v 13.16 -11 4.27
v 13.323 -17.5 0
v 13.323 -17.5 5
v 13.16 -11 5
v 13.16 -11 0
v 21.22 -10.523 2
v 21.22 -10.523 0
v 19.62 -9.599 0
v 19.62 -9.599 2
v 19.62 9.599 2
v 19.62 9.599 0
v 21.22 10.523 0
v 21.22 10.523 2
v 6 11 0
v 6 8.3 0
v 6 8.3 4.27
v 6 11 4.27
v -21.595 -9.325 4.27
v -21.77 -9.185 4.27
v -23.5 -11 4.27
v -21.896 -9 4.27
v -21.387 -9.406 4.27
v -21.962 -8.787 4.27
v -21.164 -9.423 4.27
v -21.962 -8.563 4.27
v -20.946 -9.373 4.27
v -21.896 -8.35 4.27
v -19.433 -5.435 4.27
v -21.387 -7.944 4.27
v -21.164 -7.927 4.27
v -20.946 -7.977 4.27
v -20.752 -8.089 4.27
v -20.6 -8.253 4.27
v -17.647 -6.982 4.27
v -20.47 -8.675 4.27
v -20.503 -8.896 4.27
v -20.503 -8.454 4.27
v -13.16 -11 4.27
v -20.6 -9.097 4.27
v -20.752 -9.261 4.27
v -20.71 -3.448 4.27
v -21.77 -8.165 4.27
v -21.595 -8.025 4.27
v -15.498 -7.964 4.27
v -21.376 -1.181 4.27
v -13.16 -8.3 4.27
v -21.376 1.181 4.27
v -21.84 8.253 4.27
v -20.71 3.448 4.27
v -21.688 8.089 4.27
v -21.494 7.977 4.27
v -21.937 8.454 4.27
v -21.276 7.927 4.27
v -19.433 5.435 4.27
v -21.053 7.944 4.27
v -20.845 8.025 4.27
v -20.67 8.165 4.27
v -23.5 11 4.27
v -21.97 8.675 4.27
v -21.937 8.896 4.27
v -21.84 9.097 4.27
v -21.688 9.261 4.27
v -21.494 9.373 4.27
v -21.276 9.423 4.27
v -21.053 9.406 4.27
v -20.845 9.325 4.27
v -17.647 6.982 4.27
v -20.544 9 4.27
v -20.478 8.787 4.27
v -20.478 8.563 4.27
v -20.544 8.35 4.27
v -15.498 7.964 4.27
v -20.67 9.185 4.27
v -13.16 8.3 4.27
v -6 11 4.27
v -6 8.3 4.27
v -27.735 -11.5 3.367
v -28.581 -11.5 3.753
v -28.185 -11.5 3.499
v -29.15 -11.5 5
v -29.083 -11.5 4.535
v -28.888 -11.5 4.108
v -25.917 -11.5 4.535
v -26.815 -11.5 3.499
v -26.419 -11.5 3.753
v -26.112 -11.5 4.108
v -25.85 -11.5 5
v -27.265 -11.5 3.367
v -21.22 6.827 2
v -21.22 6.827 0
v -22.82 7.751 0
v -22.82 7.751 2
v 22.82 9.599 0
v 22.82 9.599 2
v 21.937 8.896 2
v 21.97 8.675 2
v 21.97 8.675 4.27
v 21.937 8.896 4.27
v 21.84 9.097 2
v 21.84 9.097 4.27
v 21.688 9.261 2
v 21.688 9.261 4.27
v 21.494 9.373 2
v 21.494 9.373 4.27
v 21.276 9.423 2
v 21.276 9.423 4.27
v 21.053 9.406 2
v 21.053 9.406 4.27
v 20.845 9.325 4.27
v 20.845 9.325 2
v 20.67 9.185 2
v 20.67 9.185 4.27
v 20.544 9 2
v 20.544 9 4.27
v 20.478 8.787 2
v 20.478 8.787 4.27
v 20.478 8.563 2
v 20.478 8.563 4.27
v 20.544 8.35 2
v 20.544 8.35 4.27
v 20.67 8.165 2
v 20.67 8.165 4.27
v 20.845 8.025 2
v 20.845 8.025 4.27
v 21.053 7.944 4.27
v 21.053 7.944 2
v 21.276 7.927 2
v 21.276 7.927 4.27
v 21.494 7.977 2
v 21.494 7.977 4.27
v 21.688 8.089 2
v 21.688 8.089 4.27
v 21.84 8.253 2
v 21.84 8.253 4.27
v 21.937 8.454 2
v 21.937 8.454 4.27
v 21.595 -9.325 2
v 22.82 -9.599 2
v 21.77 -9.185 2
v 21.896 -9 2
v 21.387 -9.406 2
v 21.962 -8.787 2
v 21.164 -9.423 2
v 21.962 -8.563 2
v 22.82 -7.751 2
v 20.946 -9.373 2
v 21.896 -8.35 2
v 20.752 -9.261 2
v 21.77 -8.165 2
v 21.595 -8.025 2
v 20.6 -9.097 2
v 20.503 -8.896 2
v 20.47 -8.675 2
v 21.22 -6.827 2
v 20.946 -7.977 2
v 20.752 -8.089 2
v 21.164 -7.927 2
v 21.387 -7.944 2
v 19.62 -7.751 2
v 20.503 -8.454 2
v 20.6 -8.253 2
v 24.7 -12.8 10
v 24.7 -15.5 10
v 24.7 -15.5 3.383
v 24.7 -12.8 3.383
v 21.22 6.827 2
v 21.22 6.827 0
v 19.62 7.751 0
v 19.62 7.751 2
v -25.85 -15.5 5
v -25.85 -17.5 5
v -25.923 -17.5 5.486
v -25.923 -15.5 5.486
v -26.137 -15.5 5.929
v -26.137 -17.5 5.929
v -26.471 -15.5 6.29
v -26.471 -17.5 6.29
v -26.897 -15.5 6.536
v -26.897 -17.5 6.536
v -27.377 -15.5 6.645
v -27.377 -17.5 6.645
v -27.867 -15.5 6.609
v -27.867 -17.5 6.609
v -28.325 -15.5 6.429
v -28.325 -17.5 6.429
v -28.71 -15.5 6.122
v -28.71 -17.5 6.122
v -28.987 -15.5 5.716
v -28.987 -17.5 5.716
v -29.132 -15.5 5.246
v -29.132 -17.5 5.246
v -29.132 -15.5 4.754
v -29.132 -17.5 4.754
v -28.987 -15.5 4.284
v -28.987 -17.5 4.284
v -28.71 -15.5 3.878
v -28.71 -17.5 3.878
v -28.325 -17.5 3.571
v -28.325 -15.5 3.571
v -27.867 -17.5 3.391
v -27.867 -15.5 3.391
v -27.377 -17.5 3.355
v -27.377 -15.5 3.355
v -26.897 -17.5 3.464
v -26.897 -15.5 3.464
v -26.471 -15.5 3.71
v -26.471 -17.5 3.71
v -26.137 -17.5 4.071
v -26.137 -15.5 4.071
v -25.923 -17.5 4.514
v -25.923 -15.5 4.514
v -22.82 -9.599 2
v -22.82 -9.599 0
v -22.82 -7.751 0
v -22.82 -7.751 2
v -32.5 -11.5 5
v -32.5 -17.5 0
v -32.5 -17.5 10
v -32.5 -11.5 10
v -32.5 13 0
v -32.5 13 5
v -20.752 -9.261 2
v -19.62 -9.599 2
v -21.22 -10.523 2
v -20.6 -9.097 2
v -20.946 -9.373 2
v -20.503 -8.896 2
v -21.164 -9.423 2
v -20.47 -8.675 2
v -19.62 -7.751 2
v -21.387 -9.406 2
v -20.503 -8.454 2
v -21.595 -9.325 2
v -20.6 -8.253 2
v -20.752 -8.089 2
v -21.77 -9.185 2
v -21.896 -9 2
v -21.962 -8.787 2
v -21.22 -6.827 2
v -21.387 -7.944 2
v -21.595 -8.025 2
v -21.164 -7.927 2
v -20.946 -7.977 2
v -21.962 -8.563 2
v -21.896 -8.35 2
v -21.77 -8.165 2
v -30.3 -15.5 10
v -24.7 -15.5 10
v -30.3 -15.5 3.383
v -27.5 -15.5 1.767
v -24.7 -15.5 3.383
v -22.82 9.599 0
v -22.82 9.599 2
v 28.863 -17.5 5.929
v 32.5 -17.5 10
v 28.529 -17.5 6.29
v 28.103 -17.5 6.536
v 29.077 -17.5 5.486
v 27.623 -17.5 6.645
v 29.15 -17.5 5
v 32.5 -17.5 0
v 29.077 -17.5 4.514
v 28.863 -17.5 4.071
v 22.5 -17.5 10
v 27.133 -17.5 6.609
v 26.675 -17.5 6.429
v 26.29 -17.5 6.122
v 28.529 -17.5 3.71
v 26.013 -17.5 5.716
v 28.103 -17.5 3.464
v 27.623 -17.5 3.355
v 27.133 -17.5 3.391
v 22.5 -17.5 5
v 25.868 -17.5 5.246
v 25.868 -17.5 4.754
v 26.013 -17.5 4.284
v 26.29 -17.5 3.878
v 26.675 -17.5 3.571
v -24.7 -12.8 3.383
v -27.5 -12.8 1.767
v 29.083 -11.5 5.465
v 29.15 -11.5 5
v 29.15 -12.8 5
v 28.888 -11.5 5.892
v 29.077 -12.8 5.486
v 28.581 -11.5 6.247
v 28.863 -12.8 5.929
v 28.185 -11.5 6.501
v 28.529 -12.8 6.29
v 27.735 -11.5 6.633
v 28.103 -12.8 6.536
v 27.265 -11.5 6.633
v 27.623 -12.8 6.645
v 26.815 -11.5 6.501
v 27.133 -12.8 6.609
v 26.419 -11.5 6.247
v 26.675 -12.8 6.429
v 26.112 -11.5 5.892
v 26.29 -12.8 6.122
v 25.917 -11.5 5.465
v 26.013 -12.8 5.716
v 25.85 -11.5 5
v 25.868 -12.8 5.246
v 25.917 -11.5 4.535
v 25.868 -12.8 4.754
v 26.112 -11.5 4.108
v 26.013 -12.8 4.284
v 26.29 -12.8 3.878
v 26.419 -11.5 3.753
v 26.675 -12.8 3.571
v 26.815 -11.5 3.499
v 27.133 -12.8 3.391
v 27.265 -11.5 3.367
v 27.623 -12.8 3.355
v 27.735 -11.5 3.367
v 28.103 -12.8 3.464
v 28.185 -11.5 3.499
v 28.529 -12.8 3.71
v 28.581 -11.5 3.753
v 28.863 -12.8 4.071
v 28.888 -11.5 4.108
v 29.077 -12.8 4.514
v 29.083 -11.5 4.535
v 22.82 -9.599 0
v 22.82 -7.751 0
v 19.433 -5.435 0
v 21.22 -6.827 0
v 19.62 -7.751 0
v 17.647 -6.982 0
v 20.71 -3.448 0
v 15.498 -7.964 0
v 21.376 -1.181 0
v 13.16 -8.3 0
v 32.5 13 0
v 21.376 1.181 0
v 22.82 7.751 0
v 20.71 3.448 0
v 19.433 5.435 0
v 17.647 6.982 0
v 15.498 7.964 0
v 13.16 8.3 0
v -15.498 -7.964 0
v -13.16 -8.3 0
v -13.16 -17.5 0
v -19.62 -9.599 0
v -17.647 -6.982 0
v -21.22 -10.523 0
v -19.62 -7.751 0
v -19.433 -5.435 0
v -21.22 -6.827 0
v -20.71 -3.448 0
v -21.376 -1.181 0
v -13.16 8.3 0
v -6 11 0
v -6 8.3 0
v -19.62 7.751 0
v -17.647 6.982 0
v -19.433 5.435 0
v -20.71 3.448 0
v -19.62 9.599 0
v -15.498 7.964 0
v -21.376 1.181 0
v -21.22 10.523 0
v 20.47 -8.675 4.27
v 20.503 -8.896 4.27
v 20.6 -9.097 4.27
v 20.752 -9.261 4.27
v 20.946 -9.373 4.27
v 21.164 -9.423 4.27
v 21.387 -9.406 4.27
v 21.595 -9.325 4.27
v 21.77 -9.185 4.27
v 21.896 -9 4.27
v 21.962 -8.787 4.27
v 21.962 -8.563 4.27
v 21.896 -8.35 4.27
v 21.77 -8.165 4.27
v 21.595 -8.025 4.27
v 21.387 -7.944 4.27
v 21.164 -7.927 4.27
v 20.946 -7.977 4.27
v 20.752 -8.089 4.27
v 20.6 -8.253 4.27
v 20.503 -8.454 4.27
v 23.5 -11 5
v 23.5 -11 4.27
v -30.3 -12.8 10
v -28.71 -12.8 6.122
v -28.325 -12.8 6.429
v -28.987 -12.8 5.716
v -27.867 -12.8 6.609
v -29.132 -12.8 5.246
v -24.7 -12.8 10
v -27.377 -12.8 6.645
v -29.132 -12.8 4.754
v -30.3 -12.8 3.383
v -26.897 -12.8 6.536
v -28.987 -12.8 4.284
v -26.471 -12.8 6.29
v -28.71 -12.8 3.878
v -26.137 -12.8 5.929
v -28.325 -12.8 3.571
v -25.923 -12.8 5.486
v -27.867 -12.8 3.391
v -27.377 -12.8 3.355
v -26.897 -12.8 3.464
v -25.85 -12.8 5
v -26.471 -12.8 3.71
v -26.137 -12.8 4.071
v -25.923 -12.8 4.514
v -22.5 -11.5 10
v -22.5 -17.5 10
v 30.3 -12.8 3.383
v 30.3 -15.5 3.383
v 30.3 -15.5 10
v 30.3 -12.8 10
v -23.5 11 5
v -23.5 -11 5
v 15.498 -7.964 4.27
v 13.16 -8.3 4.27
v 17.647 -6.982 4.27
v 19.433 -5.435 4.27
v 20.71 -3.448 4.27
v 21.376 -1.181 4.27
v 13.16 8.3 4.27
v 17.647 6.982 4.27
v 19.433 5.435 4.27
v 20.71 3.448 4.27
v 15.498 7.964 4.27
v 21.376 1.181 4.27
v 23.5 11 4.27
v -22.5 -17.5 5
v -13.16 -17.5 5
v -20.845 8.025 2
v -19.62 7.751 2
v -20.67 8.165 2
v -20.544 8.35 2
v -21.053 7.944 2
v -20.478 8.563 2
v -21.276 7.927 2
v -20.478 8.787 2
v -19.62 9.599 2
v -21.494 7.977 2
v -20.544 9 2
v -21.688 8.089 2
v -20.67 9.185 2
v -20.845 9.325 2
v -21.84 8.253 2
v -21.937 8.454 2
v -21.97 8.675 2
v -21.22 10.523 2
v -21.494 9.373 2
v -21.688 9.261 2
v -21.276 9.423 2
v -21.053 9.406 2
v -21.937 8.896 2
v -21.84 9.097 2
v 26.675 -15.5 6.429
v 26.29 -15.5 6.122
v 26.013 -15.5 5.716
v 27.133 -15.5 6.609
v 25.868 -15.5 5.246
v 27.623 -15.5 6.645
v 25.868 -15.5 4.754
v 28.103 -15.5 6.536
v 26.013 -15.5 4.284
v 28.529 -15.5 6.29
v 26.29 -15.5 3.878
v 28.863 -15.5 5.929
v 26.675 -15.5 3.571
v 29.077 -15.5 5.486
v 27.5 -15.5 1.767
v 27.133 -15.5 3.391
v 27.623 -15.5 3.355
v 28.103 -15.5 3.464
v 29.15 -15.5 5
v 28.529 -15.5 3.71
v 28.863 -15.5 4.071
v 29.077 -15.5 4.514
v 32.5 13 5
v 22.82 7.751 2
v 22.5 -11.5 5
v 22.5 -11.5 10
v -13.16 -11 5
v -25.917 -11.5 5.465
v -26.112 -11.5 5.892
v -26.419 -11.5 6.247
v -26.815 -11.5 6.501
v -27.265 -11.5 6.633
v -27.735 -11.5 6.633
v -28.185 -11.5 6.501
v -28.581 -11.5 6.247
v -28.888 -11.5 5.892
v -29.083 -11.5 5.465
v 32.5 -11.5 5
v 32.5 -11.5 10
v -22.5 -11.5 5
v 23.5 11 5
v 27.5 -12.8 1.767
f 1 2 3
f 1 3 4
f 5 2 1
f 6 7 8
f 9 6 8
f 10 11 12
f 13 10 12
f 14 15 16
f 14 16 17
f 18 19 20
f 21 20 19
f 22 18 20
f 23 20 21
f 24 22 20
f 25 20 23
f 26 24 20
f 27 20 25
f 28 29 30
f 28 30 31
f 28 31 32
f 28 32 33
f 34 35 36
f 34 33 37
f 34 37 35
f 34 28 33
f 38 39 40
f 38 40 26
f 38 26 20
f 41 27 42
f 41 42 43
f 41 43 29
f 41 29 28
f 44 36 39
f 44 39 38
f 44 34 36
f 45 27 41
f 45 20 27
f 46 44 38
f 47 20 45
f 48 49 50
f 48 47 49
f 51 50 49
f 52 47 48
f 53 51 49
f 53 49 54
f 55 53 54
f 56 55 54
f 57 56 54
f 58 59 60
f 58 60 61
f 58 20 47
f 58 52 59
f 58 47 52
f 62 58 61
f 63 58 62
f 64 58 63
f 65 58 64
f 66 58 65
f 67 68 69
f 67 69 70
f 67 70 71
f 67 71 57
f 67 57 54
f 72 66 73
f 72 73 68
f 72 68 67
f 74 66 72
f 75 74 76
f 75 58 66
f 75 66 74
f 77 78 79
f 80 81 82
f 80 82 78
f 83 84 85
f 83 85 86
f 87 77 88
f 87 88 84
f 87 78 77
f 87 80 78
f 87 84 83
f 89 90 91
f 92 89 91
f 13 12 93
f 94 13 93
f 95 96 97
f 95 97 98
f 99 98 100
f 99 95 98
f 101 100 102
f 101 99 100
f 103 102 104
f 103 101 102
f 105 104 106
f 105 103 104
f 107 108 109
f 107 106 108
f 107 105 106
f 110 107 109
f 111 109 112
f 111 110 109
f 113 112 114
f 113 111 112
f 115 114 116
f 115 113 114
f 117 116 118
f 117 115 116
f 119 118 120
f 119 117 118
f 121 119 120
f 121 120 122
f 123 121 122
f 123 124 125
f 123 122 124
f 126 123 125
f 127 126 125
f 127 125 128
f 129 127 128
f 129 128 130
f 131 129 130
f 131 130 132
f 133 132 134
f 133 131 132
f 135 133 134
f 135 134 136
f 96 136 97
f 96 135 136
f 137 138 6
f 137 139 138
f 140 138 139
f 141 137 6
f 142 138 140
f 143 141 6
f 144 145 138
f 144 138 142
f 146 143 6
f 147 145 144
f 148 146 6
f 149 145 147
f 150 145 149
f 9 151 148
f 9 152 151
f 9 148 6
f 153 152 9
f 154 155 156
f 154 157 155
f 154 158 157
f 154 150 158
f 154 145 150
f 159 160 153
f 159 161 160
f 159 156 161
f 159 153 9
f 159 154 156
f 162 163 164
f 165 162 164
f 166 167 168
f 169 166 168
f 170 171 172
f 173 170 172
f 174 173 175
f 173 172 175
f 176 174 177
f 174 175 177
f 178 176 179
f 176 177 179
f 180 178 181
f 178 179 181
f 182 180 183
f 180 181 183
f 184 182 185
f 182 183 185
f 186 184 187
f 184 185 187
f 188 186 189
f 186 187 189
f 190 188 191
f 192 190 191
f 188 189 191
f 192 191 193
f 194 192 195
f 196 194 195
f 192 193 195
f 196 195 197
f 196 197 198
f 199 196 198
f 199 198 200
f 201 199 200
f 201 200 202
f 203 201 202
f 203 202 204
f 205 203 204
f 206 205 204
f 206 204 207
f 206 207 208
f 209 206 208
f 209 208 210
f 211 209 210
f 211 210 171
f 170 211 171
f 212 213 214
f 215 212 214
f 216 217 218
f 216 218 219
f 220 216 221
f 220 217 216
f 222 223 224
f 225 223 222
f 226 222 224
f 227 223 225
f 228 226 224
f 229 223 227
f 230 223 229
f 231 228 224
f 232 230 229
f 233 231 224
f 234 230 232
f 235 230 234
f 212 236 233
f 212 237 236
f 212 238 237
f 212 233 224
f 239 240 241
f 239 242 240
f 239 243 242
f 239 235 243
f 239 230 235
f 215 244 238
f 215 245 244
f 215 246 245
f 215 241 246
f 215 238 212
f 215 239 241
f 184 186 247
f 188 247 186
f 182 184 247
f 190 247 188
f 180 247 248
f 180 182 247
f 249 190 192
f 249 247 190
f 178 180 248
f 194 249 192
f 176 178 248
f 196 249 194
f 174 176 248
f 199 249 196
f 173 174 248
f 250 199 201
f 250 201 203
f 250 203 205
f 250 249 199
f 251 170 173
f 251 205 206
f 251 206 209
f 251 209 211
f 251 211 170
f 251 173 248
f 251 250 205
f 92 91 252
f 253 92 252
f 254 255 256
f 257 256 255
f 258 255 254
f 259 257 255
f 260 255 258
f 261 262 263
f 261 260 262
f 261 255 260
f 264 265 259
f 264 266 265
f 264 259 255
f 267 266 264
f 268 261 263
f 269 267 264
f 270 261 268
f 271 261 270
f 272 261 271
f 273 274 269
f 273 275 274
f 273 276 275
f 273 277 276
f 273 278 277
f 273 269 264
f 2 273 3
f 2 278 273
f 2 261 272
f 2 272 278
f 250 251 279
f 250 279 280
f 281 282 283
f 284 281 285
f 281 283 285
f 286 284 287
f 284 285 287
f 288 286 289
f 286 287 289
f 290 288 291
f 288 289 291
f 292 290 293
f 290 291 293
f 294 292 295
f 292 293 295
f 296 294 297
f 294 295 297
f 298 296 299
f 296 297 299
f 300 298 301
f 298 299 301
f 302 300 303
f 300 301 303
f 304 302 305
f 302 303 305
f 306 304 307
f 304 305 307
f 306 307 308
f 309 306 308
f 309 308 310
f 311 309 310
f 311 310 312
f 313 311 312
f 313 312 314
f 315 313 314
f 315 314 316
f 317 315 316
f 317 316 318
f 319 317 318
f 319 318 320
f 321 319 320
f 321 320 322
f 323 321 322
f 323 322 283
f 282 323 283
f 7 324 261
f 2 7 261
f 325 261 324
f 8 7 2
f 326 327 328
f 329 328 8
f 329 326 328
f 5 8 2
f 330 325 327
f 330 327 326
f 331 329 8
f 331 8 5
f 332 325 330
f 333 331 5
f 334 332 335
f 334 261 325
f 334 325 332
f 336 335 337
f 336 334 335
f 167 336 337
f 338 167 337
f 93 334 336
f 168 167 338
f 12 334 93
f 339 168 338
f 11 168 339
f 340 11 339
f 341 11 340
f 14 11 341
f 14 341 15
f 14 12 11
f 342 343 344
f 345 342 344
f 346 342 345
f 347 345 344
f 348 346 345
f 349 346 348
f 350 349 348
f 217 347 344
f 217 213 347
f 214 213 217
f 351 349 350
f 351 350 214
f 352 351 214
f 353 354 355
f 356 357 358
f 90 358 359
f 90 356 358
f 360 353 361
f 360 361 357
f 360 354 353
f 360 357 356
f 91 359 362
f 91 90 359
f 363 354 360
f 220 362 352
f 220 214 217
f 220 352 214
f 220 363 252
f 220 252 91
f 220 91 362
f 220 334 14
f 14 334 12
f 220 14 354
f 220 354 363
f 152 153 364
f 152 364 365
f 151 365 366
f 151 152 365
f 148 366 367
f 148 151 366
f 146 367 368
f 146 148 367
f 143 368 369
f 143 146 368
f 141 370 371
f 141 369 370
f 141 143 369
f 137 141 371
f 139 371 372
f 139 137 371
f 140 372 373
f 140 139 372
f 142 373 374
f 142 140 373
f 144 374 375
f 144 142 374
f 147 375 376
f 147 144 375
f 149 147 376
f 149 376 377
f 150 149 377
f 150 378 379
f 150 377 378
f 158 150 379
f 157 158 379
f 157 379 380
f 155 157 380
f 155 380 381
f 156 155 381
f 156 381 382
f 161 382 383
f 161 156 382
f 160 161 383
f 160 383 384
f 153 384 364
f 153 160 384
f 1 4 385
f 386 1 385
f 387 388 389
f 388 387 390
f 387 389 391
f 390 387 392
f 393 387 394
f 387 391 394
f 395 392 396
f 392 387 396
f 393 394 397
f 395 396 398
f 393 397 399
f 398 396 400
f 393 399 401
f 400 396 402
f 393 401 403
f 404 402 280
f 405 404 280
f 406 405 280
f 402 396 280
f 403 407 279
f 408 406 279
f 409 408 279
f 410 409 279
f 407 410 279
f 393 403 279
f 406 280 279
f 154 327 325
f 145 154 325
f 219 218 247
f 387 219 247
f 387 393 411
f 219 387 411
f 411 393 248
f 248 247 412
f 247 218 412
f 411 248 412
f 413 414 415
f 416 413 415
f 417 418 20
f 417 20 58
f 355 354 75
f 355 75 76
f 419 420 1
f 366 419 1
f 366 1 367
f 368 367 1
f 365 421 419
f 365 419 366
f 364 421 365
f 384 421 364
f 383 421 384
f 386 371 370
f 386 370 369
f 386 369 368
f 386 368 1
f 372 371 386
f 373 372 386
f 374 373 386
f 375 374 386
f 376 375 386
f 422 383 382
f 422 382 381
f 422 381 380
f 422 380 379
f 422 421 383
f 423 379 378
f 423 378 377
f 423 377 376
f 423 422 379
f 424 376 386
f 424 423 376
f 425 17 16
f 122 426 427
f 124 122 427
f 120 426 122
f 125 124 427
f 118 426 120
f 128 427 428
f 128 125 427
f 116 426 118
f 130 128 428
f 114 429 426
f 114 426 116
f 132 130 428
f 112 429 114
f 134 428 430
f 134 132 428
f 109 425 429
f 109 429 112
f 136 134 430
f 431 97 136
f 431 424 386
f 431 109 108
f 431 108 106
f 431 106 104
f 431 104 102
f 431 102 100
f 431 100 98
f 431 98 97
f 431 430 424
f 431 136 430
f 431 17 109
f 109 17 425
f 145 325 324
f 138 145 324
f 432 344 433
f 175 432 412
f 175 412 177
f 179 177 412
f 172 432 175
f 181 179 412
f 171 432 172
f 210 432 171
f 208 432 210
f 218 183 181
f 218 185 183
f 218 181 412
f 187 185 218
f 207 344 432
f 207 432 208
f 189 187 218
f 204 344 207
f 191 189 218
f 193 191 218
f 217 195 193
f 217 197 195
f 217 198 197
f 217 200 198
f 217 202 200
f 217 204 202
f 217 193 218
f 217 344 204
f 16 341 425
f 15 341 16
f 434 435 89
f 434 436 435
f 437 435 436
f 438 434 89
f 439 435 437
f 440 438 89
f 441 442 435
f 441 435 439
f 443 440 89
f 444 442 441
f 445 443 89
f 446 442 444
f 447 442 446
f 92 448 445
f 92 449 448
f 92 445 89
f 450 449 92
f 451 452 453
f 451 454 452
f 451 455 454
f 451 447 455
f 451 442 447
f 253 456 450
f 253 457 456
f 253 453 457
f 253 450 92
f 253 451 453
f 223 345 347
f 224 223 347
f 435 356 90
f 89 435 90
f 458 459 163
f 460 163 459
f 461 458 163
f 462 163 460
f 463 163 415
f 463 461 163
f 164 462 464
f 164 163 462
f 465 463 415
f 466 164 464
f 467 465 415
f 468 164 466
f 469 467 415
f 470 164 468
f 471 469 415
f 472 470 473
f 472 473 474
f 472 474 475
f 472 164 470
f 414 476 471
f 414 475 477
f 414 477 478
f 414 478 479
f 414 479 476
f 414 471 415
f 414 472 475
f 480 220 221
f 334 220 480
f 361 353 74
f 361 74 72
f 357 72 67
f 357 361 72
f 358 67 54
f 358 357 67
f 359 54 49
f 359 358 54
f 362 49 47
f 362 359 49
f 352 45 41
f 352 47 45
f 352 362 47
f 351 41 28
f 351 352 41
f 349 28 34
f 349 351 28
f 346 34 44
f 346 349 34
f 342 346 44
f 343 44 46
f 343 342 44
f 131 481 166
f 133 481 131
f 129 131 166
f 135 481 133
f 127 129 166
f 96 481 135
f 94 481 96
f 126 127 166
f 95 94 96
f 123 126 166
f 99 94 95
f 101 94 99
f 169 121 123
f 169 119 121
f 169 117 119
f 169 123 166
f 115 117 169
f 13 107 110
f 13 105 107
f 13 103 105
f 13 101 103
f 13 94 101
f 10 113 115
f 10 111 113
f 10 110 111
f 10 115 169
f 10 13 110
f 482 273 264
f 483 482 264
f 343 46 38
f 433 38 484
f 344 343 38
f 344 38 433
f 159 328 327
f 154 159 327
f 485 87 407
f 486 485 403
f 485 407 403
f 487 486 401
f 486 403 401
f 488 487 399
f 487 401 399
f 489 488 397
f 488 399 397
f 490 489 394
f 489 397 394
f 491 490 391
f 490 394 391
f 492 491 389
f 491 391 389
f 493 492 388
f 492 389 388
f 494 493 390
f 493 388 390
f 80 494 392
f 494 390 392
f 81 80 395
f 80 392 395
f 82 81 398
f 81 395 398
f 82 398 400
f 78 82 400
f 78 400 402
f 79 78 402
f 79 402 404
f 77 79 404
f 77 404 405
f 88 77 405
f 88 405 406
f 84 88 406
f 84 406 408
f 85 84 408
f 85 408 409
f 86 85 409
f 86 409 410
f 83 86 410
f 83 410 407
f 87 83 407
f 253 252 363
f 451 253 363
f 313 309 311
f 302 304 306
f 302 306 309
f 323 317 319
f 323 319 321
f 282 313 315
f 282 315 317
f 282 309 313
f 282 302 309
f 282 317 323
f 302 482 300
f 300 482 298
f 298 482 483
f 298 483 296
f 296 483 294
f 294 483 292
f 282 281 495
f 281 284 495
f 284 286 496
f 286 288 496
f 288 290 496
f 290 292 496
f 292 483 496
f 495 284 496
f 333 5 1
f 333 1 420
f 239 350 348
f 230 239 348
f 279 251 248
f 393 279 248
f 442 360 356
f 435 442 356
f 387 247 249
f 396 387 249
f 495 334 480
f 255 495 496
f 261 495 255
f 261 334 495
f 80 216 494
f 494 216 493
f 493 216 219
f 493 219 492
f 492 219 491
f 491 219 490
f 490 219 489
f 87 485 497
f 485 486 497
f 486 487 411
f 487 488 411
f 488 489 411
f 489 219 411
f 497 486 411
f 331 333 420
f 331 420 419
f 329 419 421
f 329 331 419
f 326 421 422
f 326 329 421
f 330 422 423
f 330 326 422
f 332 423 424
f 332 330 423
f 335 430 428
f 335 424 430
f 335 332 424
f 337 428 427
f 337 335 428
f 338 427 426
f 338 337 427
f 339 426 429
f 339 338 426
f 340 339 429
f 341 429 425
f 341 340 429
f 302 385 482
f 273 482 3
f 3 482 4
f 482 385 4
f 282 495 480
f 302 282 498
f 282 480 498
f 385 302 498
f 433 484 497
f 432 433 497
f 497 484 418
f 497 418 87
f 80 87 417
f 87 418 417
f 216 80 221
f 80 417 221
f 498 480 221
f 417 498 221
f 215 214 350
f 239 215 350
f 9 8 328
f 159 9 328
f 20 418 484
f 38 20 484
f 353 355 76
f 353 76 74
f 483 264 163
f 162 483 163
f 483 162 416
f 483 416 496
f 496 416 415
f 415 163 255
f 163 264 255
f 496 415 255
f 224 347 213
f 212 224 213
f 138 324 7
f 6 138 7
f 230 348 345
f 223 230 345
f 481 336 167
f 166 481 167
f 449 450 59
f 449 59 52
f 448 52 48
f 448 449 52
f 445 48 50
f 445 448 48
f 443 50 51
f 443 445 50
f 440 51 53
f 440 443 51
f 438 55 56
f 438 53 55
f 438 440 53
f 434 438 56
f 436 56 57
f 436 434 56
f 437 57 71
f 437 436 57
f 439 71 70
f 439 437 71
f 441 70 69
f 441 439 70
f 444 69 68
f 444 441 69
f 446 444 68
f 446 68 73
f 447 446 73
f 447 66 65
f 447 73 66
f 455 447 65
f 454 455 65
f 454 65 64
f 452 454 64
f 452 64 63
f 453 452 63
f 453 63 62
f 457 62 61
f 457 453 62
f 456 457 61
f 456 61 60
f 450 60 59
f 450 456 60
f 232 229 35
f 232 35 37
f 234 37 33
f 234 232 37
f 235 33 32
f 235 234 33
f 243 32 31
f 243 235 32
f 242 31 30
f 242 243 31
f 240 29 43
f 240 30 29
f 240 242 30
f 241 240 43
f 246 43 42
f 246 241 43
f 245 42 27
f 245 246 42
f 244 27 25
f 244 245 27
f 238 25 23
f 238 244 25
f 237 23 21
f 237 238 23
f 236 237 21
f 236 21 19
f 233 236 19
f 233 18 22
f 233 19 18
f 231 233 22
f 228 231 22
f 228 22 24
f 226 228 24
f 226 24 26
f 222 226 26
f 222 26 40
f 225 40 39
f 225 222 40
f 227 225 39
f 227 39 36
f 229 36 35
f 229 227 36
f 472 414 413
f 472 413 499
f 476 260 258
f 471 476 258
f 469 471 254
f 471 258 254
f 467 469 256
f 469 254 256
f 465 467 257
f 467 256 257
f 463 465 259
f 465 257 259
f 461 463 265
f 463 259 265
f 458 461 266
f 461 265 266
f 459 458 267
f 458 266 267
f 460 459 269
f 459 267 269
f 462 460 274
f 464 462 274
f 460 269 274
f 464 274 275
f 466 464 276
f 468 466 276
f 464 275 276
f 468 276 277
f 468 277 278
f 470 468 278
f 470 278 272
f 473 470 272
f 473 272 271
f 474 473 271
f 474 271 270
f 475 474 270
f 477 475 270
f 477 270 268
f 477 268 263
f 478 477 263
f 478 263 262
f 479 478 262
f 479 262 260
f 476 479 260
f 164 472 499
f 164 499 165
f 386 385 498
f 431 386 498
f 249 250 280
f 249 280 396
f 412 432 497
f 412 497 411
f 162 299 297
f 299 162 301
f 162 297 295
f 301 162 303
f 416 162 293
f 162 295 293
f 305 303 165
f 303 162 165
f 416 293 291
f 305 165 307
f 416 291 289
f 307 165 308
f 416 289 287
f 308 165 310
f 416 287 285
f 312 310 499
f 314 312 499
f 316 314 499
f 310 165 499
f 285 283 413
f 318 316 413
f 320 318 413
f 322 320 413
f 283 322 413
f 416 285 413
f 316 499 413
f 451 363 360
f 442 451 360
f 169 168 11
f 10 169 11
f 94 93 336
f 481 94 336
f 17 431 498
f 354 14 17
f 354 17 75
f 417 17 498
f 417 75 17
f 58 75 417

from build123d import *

# Parameters (mm, degrees)
EXTRUDE_1_DEPTH      = 5
SKETCH_1_R           = 0.75
CUT_EXTRUDE_11_DEPTH = 5
SKETCH_3_W           = 47
SKETCH_3_H           = 22
CUT_EXTRUDE_14_DEPTH = 0.73
SKETCH_4_W           = 10
SKETCH_4_H           = 10
EXTRUDE_2_DEPTH      = 6
SKETCH_5_R           = 1.65
CUT_EXTRUDE_15_DEPTH = 6
CUT_EXTRUDE_16_DEPTH = 2.7
CUT_EXTRUDE_17_DEPTH = 2


with BuildPart() as part:
    # Эскиз2 → Бобышка-Вытянуть1 (new body)
    with BuildSketch(Plane.XY):
        Polygon((-32.499999999, 13), (32.500000001, 13), (32.500000001, -17.5), (13.323102298, -17.5), (13.16, -11), (-13.16, -11), (-13.16, -17.5), (-32.499999999, -17.5), align=None)
    extrude(amount=EXTRUDE_1_DEPTH)

    # Эскиз1 → Вырез-Вытянуть11 (cut)
    with BuildSketch(Plane.XY):
        with Locations((21.22, 8.675)):
            Circle(SKETCH_1_R)
        with Locations(Location((21.22, -8.675, 0), (0, 0, 180))):
            Circle(SKETCH_1_R)
        with Locations((-21.22, -8.675)):
            Circle(SKETCH_1_R)
        with Locations(Location((-21.22, 8.675, 0), (0, 0, 180))):
            Circle(SKETCH_1_R)
        with BuildLine():
            Line((13.16, 8.3), (6, 8.3))
            Line((6, 8.3), (6, 11))
            Line((6, 11), (-6, 11))
            Line((-6, 11), (-6, 8.3))
            Line((-6, 8.3), (-13.16, 8.3))
            ThreePointArc((-13.16, 8.3), (-21.46, 0), (-13.16, -8.3))
            Line((-13.16, -8.3), (-13.16, -11))
            Line((-13.16, -11), (13.16, -11))
            Line((13.16, -11), (13.16, -8.3))
            ThreePointArc((13.16, -8.3), (21.46, 0), (13.16, 8.3))
        make_face()
    extrude(amount=CUT_EXTRUDE_11_DEPTH, mode=Mode.SUBTRACT)

    # Эскиз3 → Вырез-Вытянуть14 (cut)
    with BuildSketch(Plane.XY.offset(5)):
        Rectangle(SKETCH_3_W, SKETCH_3_H)
    extrude(amount=-CUT_EXTRUDE_14_DEPTH, mode=Mode.SUBTRACT)

    # Эскиз4 → Бобышка-Вытянуть2 (add)
    with BuildSketch(Plane.XZ.offset(17.5)):
        with Locations((-27.499999999, 5)):
            Rectangle(SKETCH_4_W, SKETCH_4_H)
        with Locations((27.500000001, 5)):
            Rectangle(SKETCH_4_W, SKETCH_4_H)
    extrude(amount=-EXTRUDE_2_DEPTH)

    # Эскиз5 → Вырез-Вытянуть15 (cut)
    with BuildSketch(Plane.XZ.offset(17.5)):
        with Locations((-27.499999999, 5)):
            Circle(SKETCH_5_R)
        with Locations((27.500000001, 5)):
            Circle(SKETCH_5_R)
    extrude(amount=-CUT_EXTRUDE_15_DEPTH, mode=Mode.SUBTRACT)

    # Эскиз6 → Вырез-Вытянуть16 (cut)
    with BuildSketch(Plane(origin=(0, -15.5, 0), x_dir=(-1, 0, 0), z_dir=(0, -1, 0))):
        Polygon((30.299999999, -6.616580754), (30.299999999, -10), (24.699999999, -10), (24.699999999, -6.616580754), (24.699999999, -3.383419246), (27.499999999, -1.766838493), (30.299999999, -3.383419246), align=None)
        Polygon((-24.700000001, -6.616580754), (-24.700000001, -10), (-30.300000001, -10), (-30.300000001, -6.616580754), (-30.300000001, -3.383419246), (-27.500000001, -1.766838493), (-24.700000001, -3.383419246), align=None)
    extrude(amount=-CUT_EXTRUDE_16_DEPTH, mode=Mode.SUBTRACT)

    # Эскиз7 → Вырез-Вытянуть17 (cut)
    with BuildSketch(Plane(origin=(0, 0, 0), x_dir=(-1, 0, 0), z_dir=(0, 0, -1))):
        Polygon((-21.22, 10.522520861), (-22.82, 9.598760431), (-22.82, 7.751239569), (-21.22, 6.827479139), (-19.62, 7.751239569), (-19.62, 9.598760431), align=None)
        Polygon((-21.22, -6.827479139), (-22.82, -7.751239569), (-22.82, -9.598760431), (-21.22, -10.522520861), (-19.62, -9.598760431), (-19.62, -7.751239569), align=None)
        Polygon((21.22, 10.522520861), (19.62, 9.598760431), (19.62, 7.751239569), (21.22, 6.827479139), (22.82, 7.751239569), (22.82, 9.598760431), align=None)
        Polygon((21.22, -6.827479139), (19.62, -7.751239569), (19.62, -9.598760431), (21.22, -10.522520861), (22.82, -9.598760431), (22.82, -7.751239569), align=None)
    extrude(amount=-CUT_EXTRUDE_17_DEPTH, mode=Mode.SUBTRACT)


solid = part.part
